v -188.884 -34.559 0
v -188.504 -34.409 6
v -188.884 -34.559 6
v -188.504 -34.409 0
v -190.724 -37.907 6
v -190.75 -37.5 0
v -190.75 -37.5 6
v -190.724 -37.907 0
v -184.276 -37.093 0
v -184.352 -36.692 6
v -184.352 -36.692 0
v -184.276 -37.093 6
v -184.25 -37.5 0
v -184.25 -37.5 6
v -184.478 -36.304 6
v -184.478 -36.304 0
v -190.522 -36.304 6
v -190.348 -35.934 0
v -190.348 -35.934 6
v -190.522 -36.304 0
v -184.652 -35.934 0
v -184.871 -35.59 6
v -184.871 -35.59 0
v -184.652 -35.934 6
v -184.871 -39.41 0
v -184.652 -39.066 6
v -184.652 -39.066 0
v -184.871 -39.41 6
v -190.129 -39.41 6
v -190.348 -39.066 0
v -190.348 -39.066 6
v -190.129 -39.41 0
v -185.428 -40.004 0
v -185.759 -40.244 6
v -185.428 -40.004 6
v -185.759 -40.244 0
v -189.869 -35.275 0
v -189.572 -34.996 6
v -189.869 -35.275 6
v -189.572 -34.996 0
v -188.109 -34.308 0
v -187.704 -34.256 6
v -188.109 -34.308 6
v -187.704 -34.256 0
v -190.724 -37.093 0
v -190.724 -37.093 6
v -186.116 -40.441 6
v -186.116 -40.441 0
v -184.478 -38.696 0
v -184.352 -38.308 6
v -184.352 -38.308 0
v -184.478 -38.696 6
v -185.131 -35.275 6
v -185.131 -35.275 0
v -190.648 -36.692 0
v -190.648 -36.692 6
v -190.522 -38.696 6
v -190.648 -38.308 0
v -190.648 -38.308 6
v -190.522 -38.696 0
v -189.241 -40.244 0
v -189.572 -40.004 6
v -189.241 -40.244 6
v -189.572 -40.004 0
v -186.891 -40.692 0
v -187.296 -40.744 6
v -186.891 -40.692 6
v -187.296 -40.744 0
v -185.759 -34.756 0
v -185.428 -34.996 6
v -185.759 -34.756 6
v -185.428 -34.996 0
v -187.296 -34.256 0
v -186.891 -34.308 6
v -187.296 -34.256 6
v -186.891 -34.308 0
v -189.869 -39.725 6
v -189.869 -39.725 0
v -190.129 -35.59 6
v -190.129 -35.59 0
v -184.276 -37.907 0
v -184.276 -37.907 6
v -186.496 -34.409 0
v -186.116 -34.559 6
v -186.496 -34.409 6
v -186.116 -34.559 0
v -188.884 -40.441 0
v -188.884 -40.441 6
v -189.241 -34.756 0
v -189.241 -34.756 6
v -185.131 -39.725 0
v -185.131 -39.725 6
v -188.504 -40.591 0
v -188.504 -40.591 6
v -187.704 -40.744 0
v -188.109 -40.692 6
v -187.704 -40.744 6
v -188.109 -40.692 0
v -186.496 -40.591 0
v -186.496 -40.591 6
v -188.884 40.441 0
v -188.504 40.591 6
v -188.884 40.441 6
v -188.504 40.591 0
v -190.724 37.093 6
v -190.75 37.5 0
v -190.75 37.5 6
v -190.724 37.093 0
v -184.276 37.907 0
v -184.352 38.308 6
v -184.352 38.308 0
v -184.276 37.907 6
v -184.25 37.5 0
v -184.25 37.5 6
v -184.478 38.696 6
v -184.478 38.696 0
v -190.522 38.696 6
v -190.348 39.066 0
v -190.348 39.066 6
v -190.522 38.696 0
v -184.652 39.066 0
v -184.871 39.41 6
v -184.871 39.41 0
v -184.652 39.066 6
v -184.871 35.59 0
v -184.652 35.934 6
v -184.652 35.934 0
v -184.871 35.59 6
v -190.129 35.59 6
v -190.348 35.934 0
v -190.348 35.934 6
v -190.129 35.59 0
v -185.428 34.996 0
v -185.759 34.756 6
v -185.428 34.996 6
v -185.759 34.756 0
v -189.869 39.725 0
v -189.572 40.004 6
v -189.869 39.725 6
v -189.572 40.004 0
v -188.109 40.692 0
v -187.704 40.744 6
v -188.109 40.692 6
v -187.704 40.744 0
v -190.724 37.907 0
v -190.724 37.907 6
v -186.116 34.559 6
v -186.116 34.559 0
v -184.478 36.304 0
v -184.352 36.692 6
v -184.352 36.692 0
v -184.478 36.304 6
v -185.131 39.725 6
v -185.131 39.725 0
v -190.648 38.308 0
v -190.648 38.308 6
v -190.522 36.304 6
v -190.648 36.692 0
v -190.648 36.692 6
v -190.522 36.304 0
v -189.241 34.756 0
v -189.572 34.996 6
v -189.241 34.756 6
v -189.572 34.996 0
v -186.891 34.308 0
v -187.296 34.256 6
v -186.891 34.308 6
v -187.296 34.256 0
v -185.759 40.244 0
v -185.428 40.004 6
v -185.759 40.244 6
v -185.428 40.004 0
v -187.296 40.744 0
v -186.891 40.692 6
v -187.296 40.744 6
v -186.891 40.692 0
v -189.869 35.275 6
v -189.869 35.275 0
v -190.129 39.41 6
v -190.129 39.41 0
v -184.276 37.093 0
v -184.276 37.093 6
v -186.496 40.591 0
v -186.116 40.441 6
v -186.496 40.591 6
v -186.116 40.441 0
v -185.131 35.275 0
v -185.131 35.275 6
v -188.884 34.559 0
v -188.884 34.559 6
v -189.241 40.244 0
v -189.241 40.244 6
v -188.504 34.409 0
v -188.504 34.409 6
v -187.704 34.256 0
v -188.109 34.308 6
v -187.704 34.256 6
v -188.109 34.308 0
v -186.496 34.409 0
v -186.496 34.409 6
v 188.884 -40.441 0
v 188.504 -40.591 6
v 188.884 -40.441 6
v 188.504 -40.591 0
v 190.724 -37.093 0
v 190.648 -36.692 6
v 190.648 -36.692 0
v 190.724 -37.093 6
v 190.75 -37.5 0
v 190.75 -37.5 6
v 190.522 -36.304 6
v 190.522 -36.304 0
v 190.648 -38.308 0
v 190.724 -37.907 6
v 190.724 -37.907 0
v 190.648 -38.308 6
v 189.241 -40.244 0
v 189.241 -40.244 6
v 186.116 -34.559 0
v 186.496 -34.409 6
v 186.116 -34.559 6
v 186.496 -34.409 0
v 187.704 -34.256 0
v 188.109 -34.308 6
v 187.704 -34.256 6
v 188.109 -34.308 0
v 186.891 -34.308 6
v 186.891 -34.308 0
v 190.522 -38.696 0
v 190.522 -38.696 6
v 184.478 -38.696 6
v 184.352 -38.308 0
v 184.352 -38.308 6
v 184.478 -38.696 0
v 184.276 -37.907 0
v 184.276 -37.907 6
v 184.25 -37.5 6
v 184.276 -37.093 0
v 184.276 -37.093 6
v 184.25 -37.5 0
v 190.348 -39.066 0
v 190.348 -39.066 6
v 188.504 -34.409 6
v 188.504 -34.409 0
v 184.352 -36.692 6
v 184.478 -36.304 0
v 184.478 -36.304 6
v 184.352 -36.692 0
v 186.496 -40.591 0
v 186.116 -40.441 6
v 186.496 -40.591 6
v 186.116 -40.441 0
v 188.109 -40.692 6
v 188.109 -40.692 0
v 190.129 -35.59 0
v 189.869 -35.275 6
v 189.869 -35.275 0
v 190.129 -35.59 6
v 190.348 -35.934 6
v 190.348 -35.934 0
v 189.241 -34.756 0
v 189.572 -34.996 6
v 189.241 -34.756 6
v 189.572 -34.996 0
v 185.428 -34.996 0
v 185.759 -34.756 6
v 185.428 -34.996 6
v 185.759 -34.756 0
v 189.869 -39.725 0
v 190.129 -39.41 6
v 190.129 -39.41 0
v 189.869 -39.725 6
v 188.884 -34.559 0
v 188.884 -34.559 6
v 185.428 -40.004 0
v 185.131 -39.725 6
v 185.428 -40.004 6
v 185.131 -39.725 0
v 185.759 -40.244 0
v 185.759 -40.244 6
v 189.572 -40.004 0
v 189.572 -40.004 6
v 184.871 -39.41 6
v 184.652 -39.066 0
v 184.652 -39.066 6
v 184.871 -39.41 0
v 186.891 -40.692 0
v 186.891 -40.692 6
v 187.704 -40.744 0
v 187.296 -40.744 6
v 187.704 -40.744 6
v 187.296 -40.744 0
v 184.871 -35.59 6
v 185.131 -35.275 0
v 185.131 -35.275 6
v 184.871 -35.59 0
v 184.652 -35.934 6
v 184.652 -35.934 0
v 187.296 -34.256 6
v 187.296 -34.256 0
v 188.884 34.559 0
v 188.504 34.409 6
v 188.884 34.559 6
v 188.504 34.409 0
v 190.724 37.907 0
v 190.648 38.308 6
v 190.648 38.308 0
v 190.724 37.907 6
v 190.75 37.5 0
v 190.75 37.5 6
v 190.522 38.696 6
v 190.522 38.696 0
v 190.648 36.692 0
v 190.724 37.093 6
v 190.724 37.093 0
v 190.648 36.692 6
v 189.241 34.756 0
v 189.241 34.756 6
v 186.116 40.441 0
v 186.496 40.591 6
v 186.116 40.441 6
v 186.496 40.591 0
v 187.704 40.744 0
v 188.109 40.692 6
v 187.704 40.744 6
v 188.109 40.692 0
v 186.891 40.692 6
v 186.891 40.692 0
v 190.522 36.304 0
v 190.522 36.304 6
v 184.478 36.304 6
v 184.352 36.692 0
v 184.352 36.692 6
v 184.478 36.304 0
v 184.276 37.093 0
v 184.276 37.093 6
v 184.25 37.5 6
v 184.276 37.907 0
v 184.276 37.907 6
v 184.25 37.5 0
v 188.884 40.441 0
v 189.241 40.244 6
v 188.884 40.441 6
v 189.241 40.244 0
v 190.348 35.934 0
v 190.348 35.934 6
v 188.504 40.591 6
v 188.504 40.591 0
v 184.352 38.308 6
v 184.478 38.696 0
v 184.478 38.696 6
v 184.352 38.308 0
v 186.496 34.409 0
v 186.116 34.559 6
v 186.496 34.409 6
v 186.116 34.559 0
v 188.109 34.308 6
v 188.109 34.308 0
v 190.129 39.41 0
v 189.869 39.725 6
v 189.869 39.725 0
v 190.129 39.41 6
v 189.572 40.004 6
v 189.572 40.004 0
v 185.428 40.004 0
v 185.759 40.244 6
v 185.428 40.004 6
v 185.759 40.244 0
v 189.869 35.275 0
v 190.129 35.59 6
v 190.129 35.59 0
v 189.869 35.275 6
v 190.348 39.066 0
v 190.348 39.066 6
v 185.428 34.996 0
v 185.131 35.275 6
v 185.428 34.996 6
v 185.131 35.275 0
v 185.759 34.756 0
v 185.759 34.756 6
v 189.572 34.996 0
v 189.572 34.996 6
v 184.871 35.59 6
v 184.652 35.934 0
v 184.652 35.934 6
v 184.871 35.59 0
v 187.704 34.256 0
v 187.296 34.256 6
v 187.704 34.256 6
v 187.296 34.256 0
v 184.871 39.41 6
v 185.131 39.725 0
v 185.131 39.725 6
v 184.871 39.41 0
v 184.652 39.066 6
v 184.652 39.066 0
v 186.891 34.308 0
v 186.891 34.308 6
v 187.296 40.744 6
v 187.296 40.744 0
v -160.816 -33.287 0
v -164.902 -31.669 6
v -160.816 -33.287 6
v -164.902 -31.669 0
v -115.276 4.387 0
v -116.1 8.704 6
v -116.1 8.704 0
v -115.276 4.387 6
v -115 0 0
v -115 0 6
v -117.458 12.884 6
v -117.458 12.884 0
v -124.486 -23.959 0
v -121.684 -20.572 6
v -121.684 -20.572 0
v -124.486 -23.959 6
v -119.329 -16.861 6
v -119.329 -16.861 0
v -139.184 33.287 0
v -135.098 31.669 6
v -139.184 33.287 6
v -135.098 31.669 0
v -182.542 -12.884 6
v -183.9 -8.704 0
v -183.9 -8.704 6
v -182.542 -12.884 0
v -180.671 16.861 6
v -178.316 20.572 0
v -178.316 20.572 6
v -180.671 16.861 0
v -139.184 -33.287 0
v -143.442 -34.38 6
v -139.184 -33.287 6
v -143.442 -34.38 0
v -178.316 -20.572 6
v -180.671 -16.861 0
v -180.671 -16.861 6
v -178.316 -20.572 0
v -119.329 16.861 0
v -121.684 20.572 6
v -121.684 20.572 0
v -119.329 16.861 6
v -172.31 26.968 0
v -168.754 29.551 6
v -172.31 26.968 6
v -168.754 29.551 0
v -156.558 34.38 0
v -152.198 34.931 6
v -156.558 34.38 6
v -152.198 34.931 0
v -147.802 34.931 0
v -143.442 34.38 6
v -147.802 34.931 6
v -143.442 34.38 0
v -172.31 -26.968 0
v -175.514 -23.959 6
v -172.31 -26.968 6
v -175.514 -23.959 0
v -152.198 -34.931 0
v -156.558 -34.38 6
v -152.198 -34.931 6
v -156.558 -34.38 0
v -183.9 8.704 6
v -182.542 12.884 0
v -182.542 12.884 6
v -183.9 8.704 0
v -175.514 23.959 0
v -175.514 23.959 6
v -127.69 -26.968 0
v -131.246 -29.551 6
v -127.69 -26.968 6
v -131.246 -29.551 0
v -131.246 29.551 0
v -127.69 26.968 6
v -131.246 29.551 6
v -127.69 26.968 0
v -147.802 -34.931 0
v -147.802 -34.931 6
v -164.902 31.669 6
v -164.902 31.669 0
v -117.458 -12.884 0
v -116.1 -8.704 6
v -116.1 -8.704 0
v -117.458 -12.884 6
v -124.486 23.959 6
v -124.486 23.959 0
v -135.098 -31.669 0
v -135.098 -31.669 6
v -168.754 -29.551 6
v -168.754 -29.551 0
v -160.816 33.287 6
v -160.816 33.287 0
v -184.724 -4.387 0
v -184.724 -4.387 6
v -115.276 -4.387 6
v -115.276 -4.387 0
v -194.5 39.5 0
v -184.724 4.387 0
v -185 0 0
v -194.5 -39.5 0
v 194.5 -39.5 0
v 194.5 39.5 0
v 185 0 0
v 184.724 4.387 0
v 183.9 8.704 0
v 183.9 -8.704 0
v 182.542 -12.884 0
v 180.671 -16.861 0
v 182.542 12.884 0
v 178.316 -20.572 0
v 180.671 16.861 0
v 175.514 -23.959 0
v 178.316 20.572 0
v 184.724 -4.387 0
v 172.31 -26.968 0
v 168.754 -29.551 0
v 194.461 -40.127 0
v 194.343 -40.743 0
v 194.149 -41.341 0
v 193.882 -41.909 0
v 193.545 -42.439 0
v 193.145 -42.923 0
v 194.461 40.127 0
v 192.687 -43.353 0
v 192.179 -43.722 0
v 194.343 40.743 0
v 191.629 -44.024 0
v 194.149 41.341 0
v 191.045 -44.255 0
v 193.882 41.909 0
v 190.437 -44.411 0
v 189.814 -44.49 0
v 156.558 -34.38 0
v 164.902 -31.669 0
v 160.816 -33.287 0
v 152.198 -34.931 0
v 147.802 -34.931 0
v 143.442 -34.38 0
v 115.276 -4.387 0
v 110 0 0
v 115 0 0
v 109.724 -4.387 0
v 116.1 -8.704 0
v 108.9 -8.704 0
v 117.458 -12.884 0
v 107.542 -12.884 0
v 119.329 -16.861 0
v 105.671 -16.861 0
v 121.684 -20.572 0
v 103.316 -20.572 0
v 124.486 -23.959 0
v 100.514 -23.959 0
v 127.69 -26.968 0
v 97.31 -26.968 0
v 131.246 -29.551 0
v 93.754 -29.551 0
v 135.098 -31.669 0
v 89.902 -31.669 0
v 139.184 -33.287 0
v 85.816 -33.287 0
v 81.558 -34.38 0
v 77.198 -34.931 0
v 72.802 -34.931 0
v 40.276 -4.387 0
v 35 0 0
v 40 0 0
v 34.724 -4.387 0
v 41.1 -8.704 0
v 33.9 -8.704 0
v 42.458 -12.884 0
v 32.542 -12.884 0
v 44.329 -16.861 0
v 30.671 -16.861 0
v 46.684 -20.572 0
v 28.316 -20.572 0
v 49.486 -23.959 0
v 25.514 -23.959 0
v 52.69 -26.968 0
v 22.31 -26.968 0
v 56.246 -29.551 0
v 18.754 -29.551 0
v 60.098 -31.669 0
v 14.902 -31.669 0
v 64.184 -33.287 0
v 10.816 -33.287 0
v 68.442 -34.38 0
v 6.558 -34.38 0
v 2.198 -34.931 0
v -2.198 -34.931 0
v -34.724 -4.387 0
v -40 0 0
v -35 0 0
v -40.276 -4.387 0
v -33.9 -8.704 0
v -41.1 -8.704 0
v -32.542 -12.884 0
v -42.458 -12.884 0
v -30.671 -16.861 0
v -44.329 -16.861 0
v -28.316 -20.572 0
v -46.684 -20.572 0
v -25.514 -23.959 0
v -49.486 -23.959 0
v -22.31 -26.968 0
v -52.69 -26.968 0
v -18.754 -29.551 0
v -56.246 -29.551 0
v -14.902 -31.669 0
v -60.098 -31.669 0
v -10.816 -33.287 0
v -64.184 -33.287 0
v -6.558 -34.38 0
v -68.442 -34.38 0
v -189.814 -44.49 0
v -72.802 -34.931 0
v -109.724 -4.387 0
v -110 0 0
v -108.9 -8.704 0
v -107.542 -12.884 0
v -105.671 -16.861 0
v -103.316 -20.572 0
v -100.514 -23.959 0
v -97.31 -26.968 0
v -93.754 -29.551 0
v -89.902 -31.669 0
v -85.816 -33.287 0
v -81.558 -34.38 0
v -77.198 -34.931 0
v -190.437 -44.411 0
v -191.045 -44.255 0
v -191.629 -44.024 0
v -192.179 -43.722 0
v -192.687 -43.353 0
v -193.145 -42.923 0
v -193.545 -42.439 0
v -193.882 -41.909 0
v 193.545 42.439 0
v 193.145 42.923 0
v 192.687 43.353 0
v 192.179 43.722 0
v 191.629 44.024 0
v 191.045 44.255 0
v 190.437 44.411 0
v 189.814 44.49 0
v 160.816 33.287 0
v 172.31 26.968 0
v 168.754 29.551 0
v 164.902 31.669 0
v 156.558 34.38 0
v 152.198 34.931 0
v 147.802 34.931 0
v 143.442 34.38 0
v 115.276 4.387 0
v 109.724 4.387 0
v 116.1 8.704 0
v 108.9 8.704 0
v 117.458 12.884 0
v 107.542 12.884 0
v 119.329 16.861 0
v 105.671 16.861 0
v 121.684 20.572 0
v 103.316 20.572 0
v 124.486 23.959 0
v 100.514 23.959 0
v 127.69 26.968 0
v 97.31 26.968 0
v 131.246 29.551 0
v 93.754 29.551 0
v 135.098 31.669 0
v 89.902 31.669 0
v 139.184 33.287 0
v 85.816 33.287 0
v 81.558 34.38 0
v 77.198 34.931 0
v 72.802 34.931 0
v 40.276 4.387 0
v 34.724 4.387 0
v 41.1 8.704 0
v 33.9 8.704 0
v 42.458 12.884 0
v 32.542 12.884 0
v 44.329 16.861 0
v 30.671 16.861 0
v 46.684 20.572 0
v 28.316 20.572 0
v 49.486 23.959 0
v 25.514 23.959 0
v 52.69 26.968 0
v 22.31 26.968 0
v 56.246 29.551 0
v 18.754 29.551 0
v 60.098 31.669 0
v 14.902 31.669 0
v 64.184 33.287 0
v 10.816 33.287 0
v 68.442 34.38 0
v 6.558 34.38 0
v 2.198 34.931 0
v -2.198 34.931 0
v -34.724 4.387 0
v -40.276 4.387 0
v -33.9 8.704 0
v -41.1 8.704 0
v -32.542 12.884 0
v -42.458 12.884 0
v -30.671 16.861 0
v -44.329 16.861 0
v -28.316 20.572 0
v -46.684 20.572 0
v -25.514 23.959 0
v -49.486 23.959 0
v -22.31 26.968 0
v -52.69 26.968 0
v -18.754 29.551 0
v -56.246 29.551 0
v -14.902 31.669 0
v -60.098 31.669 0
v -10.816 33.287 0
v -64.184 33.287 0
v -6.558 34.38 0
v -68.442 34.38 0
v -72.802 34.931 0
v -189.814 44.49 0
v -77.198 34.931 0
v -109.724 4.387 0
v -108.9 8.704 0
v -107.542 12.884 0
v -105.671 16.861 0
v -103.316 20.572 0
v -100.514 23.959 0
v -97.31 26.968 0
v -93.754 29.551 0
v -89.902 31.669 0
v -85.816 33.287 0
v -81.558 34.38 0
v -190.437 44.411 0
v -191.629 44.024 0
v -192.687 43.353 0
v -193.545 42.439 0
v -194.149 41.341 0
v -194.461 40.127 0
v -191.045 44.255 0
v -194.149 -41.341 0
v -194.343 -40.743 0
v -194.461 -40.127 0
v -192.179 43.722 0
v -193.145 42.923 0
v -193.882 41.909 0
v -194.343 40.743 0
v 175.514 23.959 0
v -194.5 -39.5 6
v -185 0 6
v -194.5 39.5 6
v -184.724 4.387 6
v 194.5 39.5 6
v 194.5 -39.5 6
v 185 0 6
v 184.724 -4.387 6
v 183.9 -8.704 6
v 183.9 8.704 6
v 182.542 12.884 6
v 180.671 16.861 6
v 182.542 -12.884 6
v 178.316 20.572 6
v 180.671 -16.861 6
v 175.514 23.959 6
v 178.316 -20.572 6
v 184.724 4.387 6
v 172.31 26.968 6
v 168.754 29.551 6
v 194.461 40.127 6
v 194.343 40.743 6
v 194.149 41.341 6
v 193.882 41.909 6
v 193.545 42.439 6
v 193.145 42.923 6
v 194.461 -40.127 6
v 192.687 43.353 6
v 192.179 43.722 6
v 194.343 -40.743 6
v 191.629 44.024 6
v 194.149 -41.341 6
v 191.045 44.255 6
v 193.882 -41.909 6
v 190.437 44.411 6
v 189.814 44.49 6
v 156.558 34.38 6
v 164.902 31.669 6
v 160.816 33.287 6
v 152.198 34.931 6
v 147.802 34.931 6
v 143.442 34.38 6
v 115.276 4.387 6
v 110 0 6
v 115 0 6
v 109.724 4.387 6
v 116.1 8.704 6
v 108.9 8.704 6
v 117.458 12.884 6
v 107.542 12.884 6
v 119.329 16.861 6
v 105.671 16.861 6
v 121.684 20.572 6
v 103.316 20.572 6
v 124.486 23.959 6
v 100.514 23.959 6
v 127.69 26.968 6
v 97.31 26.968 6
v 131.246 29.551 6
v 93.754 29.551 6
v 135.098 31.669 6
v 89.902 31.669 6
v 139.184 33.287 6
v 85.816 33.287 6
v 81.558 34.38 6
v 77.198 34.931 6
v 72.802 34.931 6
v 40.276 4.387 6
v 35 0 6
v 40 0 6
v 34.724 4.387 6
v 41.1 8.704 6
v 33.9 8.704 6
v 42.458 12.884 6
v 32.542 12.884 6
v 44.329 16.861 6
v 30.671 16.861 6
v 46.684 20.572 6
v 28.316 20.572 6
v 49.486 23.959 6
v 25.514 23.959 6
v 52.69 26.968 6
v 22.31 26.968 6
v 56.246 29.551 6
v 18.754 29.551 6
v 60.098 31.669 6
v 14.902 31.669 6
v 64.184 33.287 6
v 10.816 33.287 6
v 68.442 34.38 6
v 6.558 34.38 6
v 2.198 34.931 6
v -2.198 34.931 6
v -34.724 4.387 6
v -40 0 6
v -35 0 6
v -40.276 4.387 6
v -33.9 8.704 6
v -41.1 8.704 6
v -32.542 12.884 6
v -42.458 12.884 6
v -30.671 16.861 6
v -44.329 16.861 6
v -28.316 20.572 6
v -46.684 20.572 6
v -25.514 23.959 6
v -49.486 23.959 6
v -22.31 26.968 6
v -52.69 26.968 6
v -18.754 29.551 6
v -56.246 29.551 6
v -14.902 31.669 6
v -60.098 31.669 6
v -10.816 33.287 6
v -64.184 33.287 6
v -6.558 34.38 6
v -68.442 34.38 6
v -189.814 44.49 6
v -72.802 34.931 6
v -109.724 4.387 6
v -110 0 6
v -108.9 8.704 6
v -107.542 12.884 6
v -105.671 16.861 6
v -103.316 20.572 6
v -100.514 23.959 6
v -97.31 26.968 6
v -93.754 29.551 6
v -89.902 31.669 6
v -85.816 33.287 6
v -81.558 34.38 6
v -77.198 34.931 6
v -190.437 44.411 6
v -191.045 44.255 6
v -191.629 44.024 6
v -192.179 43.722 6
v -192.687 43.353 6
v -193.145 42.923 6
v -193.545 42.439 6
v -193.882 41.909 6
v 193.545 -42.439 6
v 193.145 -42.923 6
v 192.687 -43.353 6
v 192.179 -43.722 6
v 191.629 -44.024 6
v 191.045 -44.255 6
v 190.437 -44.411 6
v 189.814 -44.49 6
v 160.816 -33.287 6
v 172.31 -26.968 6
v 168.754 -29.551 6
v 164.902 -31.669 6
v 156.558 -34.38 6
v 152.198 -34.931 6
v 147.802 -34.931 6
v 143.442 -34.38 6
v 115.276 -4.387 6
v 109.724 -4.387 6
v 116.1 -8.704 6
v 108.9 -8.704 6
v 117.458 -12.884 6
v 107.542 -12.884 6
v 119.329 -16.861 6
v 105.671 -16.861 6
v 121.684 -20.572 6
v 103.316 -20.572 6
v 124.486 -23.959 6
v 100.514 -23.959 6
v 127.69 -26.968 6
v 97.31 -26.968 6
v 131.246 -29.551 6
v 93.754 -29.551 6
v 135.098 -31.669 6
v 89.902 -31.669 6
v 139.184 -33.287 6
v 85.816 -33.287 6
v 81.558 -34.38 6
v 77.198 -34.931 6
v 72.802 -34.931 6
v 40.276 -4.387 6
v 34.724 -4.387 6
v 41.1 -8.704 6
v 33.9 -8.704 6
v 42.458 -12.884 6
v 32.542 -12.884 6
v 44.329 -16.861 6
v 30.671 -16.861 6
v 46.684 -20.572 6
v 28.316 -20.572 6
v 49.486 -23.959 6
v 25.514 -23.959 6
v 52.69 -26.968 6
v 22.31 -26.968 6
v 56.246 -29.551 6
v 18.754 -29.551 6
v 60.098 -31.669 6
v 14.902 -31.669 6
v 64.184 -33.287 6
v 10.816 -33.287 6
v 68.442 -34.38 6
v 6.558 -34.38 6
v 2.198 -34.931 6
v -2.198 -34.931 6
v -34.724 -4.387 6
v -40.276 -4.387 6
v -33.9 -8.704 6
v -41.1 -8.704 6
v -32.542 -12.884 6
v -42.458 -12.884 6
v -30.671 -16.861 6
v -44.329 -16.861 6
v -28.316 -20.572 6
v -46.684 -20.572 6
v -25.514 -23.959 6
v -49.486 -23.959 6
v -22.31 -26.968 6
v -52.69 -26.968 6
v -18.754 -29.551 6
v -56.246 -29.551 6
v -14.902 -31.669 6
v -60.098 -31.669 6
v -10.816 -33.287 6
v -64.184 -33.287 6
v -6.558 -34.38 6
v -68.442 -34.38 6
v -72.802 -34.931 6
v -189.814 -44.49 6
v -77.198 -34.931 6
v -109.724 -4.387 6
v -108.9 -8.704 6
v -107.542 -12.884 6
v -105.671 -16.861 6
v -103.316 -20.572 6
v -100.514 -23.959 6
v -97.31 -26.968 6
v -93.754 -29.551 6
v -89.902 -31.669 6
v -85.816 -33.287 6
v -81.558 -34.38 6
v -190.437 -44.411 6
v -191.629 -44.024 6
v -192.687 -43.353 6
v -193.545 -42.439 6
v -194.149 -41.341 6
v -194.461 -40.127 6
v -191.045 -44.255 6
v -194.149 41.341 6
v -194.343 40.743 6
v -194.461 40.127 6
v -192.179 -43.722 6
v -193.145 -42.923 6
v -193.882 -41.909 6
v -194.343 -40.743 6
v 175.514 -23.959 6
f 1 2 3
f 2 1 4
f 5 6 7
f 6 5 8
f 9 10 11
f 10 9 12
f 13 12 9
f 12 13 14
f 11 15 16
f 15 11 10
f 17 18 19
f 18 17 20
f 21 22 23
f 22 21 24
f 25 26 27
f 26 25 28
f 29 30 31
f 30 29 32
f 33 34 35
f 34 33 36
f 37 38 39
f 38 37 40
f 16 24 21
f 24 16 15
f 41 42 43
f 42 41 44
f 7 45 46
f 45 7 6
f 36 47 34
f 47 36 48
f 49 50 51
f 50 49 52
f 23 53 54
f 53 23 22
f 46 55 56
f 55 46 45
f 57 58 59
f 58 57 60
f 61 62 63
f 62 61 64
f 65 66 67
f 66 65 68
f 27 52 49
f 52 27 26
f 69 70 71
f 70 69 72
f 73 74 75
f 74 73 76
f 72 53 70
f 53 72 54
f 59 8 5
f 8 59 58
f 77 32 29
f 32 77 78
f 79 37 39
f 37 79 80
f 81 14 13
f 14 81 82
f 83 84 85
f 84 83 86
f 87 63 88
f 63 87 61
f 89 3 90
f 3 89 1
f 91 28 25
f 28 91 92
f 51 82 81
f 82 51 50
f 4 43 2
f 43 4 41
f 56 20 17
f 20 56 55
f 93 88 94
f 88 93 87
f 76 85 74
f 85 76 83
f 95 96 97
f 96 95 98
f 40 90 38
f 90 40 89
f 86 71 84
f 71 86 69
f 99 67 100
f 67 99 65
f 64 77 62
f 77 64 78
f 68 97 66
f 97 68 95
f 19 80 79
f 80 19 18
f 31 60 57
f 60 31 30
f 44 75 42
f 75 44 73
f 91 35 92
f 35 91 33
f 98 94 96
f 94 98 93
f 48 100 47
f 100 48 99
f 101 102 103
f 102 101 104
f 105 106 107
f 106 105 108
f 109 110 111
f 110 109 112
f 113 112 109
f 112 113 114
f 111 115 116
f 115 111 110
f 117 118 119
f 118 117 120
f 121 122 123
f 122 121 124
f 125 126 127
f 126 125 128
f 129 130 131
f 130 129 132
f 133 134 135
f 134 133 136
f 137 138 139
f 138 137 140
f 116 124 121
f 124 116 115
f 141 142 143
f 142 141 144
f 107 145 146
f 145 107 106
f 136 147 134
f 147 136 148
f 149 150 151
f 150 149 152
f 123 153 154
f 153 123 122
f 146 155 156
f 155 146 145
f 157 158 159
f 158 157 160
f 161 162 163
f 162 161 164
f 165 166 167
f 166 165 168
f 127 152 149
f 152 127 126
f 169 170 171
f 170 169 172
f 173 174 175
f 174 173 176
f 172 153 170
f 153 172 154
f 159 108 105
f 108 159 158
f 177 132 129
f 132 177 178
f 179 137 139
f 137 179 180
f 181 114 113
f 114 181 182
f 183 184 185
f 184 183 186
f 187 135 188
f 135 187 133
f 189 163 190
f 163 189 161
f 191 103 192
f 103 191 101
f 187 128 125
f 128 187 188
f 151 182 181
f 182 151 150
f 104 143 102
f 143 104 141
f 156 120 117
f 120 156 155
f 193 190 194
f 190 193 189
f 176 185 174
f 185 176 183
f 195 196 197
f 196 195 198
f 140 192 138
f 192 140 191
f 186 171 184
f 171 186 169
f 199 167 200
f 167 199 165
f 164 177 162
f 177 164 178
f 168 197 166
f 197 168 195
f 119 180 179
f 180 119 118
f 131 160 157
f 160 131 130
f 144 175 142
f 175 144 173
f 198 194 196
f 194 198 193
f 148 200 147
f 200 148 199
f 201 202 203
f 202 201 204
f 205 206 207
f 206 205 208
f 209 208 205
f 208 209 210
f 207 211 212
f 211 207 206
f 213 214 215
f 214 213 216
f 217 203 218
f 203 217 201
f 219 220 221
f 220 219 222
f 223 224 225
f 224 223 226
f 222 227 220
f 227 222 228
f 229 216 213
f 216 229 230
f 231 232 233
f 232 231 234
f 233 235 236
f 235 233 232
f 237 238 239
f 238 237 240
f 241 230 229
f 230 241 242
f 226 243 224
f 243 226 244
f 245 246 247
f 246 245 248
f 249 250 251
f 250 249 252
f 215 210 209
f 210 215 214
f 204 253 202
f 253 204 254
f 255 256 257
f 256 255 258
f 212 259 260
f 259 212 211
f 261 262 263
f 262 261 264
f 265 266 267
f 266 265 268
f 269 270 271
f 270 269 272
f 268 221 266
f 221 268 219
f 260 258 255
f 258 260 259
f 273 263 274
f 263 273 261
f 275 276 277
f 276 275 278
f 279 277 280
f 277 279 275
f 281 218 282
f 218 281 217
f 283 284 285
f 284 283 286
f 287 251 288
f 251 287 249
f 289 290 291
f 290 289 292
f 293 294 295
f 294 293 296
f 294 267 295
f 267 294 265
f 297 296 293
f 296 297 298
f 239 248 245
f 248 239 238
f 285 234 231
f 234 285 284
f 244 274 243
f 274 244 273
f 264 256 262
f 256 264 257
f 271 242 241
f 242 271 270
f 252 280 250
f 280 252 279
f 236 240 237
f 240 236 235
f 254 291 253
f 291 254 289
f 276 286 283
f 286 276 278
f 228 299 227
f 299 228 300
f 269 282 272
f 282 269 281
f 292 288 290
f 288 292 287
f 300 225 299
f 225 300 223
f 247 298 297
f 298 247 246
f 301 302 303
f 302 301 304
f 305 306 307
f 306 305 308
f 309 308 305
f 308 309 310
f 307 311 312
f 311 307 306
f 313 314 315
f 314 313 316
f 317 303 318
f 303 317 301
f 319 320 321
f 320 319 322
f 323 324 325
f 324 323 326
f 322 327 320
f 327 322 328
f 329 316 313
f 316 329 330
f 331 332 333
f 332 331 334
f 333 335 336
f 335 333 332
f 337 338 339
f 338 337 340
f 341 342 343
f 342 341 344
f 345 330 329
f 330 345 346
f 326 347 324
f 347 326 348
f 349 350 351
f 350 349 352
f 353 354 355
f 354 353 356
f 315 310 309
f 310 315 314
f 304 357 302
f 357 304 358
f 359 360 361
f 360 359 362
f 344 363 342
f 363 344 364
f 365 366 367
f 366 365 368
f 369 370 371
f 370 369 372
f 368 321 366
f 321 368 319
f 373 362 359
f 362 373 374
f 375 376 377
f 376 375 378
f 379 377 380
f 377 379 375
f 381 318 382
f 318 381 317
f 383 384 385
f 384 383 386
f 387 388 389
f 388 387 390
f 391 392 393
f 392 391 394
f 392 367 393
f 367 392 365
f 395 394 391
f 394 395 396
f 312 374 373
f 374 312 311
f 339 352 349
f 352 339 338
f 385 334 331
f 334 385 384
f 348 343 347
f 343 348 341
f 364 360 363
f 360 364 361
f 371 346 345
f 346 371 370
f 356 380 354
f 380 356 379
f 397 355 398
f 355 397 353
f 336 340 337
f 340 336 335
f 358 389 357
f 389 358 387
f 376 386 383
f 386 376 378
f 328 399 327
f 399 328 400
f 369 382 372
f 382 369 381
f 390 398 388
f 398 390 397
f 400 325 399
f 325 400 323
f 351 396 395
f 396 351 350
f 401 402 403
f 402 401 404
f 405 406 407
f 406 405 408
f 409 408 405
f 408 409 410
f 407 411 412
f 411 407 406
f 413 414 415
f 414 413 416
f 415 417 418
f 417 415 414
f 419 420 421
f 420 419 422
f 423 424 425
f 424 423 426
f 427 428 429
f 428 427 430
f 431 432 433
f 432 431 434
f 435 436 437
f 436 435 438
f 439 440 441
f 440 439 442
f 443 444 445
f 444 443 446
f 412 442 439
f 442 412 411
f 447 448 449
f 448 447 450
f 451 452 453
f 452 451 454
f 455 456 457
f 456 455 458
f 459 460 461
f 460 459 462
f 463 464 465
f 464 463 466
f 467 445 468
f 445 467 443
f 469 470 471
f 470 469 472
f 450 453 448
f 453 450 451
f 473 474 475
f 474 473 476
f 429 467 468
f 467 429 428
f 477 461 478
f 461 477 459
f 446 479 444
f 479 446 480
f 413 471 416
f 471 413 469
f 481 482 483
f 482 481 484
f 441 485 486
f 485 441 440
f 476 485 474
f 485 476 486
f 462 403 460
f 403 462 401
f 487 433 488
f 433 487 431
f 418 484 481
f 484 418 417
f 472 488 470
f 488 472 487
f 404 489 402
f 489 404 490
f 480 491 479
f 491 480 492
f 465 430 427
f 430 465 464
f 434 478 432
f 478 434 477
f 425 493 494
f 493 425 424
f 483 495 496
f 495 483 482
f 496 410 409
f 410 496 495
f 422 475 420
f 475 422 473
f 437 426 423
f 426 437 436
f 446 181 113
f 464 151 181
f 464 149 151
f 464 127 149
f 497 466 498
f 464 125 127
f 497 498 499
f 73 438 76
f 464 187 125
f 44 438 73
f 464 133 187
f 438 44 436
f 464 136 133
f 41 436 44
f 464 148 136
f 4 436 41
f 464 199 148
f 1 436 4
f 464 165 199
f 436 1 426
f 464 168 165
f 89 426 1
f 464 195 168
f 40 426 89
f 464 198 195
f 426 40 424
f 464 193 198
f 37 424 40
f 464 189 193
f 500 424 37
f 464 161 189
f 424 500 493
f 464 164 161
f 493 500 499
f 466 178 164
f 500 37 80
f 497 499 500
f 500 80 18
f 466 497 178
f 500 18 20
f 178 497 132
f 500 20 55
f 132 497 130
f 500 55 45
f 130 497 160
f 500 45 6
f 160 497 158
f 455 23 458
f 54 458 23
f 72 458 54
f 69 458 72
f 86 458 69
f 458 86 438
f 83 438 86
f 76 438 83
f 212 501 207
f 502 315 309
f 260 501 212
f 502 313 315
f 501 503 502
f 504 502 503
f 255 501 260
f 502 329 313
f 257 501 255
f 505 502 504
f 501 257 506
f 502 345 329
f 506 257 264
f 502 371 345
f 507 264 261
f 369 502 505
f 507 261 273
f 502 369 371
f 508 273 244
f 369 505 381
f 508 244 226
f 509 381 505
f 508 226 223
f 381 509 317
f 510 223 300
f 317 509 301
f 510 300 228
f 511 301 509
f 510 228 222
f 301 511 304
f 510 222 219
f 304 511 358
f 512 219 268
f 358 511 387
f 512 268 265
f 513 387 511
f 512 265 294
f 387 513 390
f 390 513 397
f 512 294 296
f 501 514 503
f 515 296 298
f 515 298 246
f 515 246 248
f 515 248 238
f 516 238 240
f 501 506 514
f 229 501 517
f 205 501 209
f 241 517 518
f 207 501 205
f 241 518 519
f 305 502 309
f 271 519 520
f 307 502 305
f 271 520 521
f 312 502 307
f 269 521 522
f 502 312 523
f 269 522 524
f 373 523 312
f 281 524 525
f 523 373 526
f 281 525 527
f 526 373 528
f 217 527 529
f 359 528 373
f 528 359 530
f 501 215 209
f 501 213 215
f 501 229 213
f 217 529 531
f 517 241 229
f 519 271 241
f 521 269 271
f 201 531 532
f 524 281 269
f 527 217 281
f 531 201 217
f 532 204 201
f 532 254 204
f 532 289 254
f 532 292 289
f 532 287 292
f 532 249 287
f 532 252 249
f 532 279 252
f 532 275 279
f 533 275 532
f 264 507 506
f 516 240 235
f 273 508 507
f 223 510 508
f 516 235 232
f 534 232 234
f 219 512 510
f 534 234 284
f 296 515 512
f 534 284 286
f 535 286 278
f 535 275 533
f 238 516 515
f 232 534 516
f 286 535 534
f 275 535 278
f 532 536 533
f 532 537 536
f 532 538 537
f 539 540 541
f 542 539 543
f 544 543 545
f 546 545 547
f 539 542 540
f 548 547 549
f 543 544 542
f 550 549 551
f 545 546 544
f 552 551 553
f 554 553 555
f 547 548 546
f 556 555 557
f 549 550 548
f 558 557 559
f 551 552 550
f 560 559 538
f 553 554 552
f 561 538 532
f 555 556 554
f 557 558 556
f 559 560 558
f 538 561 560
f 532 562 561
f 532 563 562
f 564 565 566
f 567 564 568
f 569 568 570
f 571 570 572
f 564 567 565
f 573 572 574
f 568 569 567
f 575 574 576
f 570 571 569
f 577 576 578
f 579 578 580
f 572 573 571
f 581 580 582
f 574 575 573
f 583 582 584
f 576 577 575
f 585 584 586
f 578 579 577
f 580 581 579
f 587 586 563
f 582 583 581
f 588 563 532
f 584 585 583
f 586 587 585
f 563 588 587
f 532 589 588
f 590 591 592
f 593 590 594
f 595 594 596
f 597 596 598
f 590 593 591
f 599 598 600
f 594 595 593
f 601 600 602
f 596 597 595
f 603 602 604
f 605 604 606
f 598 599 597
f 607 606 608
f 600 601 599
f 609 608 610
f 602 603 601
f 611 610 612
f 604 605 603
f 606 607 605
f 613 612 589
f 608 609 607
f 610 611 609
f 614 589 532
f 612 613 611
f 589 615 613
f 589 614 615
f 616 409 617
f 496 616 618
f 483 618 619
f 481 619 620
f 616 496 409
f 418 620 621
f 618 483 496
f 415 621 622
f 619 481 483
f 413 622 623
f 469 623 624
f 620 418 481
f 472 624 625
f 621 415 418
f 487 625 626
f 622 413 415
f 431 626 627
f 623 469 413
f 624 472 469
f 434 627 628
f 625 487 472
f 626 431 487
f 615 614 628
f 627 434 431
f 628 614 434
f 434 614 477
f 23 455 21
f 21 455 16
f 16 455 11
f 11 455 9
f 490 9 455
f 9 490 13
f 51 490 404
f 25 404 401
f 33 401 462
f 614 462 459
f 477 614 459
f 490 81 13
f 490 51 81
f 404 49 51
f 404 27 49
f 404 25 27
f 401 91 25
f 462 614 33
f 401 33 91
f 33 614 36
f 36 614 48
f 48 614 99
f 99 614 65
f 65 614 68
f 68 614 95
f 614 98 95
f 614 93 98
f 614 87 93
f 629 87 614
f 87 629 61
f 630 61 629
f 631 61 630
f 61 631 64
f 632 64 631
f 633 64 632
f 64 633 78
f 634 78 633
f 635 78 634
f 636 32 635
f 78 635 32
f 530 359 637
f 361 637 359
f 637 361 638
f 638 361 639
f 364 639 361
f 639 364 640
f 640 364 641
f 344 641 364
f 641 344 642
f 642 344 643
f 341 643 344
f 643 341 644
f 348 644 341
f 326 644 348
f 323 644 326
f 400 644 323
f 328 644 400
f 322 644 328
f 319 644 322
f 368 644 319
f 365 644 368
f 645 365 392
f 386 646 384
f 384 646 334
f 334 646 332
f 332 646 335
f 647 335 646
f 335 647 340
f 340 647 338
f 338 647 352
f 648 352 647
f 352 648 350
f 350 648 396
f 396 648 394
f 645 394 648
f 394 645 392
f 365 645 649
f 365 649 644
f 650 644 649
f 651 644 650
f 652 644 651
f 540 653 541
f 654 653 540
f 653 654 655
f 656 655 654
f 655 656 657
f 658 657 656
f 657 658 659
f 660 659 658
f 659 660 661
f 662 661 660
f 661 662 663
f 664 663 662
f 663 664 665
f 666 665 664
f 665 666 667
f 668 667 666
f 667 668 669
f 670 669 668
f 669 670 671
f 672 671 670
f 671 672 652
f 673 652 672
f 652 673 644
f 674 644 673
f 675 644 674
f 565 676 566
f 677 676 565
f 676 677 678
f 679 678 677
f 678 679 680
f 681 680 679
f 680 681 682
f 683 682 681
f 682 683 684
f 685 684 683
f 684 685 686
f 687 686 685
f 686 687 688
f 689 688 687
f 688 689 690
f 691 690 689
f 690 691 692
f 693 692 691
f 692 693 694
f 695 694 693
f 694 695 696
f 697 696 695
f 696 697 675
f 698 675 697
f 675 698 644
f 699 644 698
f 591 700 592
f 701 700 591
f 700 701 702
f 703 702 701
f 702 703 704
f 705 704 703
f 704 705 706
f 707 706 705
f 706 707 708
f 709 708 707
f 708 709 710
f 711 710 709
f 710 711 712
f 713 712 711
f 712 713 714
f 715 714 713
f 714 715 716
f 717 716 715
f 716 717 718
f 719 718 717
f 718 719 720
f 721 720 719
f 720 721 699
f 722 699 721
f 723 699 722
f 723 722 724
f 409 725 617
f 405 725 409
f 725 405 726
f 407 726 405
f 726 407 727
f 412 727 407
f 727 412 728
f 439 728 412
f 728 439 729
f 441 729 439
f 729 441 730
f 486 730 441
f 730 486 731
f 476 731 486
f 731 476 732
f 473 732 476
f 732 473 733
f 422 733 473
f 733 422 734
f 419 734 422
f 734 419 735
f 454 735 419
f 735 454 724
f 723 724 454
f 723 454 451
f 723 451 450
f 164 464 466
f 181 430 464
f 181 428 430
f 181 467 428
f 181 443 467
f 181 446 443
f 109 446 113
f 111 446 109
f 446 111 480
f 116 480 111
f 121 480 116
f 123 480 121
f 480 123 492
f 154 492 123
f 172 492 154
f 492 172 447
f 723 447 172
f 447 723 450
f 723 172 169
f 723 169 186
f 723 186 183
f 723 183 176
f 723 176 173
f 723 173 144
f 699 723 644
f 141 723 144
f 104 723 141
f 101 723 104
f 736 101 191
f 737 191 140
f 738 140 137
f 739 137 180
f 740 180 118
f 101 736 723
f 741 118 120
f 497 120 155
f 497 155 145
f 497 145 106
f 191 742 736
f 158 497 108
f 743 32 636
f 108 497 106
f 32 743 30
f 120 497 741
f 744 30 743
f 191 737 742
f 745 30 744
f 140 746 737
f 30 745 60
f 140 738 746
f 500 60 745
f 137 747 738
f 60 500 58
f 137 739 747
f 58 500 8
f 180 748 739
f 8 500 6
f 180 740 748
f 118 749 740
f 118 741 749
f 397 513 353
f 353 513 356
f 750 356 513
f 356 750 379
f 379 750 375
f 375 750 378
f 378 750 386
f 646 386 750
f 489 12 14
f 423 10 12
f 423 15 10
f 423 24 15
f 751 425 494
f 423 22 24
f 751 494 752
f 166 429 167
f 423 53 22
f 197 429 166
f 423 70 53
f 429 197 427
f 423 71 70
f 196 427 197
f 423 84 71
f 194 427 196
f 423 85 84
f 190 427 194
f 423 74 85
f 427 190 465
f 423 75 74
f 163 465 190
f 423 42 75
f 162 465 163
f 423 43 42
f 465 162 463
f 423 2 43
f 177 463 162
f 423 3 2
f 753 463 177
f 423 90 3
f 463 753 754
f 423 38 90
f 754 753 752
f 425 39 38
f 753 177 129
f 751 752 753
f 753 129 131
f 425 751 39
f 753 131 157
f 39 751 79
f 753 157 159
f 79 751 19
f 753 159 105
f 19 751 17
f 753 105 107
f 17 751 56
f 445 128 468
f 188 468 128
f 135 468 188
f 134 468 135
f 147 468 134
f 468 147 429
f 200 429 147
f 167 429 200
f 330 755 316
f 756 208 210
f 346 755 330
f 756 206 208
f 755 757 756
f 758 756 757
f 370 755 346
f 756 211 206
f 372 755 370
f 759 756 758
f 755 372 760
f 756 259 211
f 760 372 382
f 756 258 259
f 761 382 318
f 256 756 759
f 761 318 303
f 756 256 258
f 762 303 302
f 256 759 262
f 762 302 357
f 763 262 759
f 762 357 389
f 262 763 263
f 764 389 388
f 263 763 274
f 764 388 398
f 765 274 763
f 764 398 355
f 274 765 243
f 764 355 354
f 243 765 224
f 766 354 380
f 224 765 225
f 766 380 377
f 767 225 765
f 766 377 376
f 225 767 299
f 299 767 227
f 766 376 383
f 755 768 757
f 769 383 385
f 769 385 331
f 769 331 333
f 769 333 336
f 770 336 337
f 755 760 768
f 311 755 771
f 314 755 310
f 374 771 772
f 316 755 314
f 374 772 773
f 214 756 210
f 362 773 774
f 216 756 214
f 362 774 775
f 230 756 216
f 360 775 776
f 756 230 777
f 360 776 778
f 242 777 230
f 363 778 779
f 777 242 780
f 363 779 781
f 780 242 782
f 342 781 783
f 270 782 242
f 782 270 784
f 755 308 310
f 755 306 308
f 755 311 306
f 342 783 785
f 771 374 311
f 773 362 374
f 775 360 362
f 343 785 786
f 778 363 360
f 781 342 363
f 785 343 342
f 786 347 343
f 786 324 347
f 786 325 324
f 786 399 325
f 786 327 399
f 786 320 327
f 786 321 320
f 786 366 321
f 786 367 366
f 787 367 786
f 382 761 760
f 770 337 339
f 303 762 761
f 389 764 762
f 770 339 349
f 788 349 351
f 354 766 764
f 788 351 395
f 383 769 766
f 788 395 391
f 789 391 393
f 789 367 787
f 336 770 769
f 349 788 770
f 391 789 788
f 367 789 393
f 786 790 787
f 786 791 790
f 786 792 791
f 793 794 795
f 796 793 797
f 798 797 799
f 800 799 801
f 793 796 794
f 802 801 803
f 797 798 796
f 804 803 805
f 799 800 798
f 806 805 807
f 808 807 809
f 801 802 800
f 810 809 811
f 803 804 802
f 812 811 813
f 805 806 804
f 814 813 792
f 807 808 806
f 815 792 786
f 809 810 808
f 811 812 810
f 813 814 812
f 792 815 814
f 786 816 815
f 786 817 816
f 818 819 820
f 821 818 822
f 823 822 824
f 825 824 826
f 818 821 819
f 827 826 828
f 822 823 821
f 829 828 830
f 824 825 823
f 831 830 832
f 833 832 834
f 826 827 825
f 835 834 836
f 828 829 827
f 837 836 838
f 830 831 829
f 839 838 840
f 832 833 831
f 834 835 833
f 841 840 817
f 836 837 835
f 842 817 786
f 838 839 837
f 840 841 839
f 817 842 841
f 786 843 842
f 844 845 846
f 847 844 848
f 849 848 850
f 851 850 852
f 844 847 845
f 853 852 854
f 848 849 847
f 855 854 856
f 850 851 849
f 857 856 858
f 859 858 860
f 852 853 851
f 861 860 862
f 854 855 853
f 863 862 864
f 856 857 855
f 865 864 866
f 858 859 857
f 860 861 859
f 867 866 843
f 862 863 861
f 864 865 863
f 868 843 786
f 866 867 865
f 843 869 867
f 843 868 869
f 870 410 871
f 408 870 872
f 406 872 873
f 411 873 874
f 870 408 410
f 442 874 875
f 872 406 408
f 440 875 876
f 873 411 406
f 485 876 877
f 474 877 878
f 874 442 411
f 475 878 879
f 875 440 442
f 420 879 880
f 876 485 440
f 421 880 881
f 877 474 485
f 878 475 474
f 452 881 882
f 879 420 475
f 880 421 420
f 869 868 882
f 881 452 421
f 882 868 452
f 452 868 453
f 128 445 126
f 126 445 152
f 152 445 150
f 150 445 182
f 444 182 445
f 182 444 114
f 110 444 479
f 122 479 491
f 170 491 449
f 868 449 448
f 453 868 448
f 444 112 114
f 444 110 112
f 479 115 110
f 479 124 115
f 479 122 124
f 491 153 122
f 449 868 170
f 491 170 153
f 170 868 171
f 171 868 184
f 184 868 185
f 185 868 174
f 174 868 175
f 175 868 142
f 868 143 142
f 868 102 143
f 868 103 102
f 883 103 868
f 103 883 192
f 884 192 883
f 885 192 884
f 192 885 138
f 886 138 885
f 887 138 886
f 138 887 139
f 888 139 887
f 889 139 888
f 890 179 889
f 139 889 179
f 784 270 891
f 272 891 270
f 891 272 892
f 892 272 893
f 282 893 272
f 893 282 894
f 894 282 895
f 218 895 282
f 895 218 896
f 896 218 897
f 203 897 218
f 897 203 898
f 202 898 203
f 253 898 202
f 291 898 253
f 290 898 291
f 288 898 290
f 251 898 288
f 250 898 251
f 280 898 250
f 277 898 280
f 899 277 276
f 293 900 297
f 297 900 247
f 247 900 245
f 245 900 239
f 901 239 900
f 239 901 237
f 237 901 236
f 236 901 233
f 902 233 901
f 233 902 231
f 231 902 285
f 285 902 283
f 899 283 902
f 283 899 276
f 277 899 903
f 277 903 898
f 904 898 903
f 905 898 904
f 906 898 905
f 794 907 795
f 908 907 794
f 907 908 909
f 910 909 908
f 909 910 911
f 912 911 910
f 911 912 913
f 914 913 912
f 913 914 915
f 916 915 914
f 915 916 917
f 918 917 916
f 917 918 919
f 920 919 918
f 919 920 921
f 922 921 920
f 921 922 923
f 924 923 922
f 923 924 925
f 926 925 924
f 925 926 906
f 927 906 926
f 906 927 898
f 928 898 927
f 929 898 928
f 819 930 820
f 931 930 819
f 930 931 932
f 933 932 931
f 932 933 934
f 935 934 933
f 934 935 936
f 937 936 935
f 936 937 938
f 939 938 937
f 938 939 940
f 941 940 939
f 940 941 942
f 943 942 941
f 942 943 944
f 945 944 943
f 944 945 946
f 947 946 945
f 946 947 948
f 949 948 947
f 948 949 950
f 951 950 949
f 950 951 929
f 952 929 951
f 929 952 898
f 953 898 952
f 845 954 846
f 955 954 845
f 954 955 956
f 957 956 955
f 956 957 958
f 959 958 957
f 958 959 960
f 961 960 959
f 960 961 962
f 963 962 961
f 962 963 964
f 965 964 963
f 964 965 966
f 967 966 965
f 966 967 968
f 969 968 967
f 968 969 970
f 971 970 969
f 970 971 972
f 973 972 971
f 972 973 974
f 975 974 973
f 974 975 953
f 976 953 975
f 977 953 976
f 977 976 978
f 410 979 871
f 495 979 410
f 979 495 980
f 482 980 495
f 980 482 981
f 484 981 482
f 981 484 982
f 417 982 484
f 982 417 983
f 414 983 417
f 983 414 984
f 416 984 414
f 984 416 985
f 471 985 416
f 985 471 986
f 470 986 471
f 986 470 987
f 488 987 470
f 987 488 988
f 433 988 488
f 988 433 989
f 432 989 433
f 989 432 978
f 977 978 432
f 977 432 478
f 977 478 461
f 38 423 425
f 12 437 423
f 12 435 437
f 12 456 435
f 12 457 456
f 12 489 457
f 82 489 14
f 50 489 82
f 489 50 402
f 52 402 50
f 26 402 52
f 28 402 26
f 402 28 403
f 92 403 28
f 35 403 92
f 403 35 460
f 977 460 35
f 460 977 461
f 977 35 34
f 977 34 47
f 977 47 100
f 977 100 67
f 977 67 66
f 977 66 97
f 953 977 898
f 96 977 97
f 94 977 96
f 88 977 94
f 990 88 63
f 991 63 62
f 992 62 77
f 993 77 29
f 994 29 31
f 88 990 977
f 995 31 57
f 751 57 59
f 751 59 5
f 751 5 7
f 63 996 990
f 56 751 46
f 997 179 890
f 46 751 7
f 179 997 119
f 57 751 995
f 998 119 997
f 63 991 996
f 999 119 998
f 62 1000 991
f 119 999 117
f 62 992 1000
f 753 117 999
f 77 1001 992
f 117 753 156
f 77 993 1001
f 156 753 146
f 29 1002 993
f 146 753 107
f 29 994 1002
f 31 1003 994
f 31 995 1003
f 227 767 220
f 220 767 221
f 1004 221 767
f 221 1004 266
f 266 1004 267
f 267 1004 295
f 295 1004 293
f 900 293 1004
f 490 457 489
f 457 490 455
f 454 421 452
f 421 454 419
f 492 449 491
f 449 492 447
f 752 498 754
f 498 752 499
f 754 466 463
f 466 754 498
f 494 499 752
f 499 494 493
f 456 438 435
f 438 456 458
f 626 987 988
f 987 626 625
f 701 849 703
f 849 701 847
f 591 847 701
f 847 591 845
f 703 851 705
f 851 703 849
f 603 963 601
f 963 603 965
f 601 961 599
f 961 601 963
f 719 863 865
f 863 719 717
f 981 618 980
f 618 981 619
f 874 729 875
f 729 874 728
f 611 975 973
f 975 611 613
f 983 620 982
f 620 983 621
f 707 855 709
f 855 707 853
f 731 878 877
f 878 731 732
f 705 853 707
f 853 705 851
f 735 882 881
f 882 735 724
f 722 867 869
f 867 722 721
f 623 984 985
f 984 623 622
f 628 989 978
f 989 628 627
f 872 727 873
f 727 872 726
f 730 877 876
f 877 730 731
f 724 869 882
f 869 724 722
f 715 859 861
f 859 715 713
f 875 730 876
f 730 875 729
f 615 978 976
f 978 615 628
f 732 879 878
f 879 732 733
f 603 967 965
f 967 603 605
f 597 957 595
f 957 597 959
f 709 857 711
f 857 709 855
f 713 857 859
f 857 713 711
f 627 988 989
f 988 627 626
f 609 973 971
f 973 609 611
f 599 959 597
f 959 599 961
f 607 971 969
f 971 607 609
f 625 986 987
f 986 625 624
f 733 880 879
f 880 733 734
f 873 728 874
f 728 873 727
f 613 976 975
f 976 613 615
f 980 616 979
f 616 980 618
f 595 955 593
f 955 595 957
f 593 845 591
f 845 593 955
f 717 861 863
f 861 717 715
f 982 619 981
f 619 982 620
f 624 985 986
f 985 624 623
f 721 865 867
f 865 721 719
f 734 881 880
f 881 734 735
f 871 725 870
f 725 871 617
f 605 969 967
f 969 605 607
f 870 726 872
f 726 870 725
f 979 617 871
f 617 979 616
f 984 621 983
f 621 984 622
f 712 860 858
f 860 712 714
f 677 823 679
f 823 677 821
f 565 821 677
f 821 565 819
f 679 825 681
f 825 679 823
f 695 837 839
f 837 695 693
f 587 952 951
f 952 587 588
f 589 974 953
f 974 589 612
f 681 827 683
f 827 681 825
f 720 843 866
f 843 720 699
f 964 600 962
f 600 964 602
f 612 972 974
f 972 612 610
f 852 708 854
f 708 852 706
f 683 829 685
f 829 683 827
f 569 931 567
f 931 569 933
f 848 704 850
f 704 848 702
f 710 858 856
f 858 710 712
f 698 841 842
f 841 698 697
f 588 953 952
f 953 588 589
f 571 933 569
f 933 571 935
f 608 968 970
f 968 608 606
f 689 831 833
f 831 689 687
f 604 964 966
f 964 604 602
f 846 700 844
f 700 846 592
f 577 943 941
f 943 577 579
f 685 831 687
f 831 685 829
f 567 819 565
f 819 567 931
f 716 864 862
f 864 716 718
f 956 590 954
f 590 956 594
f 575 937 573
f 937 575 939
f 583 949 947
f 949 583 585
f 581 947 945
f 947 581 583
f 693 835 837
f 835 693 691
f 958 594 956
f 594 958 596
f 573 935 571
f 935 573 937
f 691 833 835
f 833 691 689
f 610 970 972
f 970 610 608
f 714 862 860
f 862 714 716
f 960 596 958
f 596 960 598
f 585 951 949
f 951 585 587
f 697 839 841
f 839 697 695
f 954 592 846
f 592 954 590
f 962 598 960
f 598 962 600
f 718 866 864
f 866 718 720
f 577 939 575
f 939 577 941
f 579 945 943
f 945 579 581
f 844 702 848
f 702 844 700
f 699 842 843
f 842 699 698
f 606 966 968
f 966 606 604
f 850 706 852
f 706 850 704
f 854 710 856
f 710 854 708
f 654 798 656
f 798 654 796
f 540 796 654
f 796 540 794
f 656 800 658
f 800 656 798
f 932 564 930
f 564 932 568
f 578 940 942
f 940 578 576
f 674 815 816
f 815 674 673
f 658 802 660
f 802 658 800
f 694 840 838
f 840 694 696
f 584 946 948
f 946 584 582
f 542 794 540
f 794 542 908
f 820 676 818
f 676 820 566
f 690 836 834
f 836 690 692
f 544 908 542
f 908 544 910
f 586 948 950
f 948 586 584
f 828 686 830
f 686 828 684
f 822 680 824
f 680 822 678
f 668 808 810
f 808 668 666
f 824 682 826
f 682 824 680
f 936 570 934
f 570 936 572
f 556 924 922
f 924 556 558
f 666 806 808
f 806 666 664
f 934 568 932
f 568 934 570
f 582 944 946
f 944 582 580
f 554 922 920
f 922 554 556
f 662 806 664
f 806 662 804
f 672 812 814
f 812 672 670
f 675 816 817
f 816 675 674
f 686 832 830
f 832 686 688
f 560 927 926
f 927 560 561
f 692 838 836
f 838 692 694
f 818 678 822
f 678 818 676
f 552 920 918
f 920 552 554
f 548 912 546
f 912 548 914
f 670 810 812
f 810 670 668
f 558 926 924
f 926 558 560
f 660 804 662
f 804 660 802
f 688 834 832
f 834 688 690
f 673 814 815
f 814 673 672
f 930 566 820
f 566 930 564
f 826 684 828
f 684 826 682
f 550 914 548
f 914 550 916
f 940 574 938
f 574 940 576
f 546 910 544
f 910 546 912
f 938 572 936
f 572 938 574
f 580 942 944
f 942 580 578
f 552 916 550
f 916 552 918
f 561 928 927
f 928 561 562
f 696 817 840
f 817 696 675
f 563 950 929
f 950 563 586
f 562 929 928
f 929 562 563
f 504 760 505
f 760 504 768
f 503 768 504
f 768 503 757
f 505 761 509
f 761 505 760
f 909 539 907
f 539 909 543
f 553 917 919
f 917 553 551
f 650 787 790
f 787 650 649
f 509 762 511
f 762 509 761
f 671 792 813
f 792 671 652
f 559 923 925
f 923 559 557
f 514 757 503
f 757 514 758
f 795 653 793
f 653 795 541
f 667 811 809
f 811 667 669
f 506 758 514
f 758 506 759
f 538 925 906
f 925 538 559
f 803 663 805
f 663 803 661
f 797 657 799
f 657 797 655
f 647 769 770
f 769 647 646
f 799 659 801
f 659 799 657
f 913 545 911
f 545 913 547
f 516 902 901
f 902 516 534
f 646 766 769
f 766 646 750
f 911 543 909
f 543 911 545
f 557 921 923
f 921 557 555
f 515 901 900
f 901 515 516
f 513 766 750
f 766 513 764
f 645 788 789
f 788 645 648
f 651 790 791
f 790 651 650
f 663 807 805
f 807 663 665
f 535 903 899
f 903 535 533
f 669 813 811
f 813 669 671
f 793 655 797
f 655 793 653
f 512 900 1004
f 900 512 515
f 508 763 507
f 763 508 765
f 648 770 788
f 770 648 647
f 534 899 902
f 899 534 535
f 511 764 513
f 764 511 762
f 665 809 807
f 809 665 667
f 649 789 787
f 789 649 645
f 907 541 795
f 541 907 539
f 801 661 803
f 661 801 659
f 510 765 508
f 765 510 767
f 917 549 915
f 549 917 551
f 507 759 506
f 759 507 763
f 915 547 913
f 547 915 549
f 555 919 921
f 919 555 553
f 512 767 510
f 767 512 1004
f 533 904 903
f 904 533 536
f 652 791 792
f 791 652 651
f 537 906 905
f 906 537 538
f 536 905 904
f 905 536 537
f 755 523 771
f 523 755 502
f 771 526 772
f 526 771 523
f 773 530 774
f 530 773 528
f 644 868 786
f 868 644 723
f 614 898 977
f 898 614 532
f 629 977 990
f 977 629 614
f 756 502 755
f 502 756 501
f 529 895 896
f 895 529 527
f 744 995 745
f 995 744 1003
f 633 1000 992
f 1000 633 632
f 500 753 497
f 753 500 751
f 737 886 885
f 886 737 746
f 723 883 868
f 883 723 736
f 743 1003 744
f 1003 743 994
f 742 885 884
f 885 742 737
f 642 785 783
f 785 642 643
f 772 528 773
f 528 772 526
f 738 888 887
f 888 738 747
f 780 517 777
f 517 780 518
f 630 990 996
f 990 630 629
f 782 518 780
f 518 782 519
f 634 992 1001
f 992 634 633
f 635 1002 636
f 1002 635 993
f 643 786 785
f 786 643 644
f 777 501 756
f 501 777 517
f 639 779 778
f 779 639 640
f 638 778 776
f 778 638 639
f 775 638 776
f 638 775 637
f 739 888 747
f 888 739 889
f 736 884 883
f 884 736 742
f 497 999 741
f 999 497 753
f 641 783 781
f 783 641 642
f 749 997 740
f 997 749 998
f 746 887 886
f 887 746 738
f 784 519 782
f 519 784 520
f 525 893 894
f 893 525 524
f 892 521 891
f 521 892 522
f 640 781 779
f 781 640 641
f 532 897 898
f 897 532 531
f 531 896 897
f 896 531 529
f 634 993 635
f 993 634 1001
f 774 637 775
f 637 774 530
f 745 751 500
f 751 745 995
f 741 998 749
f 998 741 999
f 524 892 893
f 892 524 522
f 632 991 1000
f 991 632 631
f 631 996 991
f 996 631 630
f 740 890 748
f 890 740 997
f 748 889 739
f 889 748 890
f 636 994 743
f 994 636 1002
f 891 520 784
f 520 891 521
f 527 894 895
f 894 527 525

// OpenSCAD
$fn = 50;


difference() {
	union() {
		hull() {
			translate(v = [-189.5000000000, 39.5000000000, 0]) {
				cylinder(h = 6, r = 5);
			}
			translate(v = [189.5000000000, 39.5000000000, 0]) {
				cylinder(h = 6, r = 5);
			}
			translate(v = [-189.5000000000, -39.5000000000, 0]) {
				cylinder(h = 6, r = 5);
			}
			translate(v = [189.5000000000, -39.5000000000, 0]) {
				cylinder(h = 6, r = 5);
			}
		}
	}
	union() {
		#translate(v = [-187.5000000000, -37.5000000000, -100.0000000000]) {
			cylinder(h = 200, r = 3.2500000000);
		}
		#translate(v = [-187.5000000000, 37.5000000000, -100.0000000000]) {
			cylinder(h = 200, r = 3.2500000000);
		}
		#translate(v = [187.5000000000, -37.5000000000, -100.0000000000]) {
			cylinder(h = 200, r = 3.2500000000);
		}
		#translate(v = [187.5000000000, 37.5000000000, -100.0000000000]) {
			cylinder(h = 200, r = 3.2500000000);
		}
		#translate(v = [-150.0000000000, 0, 0]) {
			cylinder(h = 6, r = 35.0000000000);
		}
		#translate(v = [-75.0000000000, 0, 0]) {
			cylinder(h = 6, r = 35.0000000000);
		}
		#cylinder(h = 6, r = 35.0000000000);
		#translate(v = [75.0000000000, 0, 0]) {
			cylinder(h = 6, r = 35.0000000000);
		}
		#translate(v = [150.0000000000, 0, 0]) {
			cylinder(h = 6, r = 35.0000000000);
		}
	}
}
